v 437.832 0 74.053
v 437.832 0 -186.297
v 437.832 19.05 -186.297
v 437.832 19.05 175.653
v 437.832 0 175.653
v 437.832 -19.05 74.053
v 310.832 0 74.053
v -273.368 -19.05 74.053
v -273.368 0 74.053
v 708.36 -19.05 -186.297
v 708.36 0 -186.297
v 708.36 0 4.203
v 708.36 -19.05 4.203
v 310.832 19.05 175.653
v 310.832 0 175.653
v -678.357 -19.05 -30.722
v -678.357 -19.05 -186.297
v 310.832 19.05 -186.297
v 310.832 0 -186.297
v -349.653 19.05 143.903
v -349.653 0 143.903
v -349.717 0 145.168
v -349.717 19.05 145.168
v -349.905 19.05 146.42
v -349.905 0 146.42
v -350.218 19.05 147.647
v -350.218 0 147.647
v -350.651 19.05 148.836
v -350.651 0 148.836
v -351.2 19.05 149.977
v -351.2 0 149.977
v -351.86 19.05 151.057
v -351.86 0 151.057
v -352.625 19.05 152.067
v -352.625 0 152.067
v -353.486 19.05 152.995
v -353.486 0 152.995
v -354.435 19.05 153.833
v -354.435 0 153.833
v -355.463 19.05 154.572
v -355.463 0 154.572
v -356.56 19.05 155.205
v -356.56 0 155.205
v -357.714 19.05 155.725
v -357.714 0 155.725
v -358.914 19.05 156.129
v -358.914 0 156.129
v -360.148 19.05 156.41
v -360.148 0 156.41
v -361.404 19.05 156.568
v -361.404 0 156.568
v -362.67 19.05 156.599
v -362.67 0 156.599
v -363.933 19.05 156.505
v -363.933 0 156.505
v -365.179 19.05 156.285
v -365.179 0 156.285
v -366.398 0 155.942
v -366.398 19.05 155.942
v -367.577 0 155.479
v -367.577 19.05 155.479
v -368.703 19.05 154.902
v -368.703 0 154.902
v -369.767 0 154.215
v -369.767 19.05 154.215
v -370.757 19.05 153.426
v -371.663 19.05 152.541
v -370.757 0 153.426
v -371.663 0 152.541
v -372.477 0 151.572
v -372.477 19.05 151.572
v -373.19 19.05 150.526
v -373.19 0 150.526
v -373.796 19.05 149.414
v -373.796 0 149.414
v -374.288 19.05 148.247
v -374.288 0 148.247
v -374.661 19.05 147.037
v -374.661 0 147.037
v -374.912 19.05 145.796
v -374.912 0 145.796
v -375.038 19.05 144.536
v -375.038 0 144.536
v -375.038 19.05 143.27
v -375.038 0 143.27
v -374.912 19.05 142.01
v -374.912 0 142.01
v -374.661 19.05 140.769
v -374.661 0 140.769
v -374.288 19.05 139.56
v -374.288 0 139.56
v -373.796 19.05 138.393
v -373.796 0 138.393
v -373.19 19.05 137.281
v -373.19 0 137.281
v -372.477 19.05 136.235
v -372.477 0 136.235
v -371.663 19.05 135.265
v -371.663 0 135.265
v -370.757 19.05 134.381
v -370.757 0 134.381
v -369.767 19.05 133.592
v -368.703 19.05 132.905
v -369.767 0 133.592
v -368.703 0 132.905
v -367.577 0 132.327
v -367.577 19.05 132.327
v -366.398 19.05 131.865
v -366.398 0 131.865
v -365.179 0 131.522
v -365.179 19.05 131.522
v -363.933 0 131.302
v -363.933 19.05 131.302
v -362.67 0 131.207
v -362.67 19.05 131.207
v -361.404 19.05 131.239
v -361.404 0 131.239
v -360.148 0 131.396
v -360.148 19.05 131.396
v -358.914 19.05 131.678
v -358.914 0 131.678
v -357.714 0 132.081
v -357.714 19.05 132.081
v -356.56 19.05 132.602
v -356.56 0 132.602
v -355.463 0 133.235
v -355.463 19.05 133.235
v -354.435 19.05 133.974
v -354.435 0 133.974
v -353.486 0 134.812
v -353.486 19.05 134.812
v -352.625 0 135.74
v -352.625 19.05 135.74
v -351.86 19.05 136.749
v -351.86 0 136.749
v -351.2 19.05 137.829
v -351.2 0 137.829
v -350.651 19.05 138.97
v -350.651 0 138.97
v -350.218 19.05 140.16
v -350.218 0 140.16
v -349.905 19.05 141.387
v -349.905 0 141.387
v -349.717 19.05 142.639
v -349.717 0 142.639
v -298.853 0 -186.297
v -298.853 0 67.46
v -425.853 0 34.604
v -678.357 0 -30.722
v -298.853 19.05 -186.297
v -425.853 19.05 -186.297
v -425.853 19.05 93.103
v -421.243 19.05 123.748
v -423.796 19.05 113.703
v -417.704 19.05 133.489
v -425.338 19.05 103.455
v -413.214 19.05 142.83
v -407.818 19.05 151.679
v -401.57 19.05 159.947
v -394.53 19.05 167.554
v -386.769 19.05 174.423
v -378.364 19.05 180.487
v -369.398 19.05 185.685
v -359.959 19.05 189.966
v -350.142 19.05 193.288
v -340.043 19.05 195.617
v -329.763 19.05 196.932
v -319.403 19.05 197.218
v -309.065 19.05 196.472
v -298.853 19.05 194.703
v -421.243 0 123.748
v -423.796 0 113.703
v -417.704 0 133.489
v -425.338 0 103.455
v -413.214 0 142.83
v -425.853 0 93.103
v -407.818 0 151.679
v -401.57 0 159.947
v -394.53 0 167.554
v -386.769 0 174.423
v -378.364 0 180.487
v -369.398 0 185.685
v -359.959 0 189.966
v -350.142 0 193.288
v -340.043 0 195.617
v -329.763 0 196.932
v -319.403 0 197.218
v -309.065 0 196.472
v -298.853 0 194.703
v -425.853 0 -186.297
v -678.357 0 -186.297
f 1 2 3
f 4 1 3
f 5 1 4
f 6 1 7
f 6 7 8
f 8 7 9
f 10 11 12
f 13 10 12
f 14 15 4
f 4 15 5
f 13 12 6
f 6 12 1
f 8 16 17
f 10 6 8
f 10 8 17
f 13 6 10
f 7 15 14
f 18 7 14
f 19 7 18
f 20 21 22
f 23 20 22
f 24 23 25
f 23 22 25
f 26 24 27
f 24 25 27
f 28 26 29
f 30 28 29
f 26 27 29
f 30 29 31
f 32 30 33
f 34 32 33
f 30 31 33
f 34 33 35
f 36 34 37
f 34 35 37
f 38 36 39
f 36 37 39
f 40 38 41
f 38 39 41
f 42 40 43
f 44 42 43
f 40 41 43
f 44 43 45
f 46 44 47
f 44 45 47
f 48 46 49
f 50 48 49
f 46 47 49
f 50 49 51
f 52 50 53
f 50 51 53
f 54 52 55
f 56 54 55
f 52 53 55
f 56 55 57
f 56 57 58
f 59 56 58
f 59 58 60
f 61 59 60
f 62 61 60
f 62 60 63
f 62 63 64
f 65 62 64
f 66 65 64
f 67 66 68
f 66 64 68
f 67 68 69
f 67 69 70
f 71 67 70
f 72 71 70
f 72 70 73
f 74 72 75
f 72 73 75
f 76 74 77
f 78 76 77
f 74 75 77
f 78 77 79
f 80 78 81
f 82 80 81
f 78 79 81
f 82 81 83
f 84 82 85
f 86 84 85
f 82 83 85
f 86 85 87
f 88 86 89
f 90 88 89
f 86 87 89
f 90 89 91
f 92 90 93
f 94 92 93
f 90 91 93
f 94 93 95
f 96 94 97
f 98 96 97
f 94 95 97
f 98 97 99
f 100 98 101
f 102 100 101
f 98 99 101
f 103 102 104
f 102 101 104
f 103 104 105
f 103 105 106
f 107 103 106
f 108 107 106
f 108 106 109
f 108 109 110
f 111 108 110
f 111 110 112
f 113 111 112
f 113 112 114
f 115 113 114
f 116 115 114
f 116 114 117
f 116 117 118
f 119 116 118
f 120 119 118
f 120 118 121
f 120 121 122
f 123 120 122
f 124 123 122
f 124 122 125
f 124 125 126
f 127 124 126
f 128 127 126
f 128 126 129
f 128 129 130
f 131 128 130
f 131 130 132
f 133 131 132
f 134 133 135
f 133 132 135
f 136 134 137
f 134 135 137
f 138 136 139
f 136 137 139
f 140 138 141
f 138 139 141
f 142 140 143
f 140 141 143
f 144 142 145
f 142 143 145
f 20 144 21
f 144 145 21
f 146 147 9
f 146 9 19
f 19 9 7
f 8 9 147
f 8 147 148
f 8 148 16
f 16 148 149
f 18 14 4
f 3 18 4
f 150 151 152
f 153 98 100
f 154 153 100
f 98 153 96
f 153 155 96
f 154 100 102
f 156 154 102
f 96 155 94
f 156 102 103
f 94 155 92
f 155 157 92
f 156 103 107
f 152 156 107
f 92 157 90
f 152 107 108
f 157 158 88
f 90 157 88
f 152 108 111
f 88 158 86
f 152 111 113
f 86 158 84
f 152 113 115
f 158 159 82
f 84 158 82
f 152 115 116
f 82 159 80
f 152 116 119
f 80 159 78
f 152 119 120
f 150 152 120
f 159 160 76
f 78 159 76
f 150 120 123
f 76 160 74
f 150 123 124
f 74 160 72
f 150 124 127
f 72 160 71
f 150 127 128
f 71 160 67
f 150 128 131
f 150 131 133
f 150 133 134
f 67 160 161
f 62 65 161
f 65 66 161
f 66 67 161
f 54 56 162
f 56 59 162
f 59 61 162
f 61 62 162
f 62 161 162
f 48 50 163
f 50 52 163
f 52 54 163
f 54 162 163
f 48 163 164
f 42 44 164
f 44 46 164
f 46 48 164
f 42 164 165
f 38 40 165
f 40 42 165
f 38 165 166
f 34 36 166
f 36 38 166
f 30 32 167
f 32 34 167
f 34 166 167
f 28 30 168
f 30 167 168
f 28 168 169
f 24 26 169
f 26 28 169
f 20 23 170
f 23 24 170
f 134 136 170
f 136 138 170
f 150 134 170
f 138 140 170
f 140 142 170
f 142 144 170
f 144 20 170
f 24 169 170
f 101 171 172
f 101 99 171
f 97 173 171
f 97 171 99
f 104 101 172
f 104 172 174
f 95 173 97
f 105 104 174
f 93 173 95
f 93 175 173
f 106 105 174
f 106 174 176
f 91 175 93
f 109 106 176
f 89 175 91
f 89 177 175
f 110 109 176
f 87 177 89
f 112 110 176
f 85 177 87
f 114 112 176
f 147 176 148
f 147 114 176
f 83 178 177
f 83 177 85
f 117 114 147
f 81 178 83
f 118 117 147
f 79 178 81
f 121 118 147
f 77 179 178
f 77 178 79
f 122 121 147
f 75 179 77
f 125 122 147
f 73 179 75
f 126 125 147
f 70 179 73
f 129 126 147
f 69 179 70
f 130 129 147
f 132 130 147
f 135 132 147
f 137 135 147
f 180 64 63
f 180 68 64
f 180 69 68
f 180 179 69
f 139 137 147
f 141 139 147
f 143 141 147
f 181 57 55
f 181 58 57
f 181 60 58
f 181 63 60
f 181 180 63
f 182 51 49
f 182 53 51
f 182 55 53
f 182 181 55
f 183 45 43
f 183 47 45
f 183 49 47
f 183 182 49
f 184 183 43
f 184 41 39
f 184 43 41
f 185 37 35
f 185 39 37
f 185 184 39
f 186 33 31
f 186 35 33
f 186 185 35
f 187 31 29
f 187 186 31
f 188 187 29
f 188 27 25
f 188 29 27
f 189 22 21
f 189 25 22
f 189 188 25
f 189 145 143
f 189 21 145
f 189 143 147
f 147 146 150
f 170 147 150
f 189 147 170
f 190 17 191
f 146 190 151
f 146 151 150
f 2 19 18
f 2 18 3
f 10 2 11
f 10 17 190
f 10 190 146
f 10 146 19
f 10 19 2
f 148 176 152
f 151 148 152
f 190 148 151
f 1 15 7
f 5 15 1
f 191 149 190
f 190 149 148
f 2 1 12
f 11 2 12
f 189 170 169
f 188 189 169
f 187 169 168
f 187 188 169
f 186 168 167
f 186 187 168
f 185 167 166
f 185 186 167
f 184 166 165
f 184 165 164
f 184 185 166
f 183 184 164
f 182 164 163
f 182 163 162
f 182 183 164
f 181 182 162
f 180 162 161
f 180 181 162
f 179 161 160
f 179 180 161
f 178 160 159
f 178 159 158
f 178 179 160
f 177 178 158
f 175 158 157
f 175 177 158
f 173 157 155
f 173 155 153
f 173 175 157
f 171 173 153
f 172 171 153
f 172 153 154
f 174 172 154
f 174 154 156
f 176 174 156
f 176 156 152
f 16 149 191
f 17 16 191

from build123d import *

# Parameters (mm, degrees)
F3_DEPTH = 19.05
F1_R     = 12.7
F4_DEPTH = 19.05
F2_W     = 127
F2_H     = 101.6
F2_H_2   = 260.35
F5_DEPTH = 19.05


with BuildPart() as f3:
    # F0 (on Front) → F3 (new body)
    with BuildSketch(Plane.XZ):
        Polygon((-678.356835, -30.721705), (-678.356835, -186.296705), (708.359913, -186.296705), (708.359913, 4.203295), (437.832026, 74.053295), (-273.367974, 74.053295), align=None)
    extrude(amount=F3_DEPTH)

    # F1 (on face) → F4 (join)
    with BuildSketch(Plane.XZ):
        with BuildLine():
            Line((-425.853448, 34.603653), (-298.853448, 67.459927))
            Line((-298.853448, 67.459927), (-298.853448, 194.703295))
            ThreePointArc((-298.853448, 194.703295), (-386.76919, 174.422972), (-425.853448, 93.103295))
            Line((-425.853448, 93.103295), (-425.853448, 34.603653))
        make_face()
        with Locations((-362.353448, 143.903295)):
            Circle(F1_R, mode=Mode.SUBTRACT)
        Polygon((-425.853448, -186.296705), (-298.853448, -186.296705), (-298.853448, 67.459927), (-425.853448, 34.603653), align=None)
    extrude(amount=-F4_DEPTH)

    # F2 (on face) → F5 (join)
    with BuildSketch(Plane.XZ):
        with Locations((374.332026, 124.853295)):
            Rectangle(F2_W, F2_H)
        with Locations((374.332026, -56.121705)):
            Rectangle(F2_W, F2_H_2)
    extrude(amount=-F5_DEPTH)


solid = f3.part
